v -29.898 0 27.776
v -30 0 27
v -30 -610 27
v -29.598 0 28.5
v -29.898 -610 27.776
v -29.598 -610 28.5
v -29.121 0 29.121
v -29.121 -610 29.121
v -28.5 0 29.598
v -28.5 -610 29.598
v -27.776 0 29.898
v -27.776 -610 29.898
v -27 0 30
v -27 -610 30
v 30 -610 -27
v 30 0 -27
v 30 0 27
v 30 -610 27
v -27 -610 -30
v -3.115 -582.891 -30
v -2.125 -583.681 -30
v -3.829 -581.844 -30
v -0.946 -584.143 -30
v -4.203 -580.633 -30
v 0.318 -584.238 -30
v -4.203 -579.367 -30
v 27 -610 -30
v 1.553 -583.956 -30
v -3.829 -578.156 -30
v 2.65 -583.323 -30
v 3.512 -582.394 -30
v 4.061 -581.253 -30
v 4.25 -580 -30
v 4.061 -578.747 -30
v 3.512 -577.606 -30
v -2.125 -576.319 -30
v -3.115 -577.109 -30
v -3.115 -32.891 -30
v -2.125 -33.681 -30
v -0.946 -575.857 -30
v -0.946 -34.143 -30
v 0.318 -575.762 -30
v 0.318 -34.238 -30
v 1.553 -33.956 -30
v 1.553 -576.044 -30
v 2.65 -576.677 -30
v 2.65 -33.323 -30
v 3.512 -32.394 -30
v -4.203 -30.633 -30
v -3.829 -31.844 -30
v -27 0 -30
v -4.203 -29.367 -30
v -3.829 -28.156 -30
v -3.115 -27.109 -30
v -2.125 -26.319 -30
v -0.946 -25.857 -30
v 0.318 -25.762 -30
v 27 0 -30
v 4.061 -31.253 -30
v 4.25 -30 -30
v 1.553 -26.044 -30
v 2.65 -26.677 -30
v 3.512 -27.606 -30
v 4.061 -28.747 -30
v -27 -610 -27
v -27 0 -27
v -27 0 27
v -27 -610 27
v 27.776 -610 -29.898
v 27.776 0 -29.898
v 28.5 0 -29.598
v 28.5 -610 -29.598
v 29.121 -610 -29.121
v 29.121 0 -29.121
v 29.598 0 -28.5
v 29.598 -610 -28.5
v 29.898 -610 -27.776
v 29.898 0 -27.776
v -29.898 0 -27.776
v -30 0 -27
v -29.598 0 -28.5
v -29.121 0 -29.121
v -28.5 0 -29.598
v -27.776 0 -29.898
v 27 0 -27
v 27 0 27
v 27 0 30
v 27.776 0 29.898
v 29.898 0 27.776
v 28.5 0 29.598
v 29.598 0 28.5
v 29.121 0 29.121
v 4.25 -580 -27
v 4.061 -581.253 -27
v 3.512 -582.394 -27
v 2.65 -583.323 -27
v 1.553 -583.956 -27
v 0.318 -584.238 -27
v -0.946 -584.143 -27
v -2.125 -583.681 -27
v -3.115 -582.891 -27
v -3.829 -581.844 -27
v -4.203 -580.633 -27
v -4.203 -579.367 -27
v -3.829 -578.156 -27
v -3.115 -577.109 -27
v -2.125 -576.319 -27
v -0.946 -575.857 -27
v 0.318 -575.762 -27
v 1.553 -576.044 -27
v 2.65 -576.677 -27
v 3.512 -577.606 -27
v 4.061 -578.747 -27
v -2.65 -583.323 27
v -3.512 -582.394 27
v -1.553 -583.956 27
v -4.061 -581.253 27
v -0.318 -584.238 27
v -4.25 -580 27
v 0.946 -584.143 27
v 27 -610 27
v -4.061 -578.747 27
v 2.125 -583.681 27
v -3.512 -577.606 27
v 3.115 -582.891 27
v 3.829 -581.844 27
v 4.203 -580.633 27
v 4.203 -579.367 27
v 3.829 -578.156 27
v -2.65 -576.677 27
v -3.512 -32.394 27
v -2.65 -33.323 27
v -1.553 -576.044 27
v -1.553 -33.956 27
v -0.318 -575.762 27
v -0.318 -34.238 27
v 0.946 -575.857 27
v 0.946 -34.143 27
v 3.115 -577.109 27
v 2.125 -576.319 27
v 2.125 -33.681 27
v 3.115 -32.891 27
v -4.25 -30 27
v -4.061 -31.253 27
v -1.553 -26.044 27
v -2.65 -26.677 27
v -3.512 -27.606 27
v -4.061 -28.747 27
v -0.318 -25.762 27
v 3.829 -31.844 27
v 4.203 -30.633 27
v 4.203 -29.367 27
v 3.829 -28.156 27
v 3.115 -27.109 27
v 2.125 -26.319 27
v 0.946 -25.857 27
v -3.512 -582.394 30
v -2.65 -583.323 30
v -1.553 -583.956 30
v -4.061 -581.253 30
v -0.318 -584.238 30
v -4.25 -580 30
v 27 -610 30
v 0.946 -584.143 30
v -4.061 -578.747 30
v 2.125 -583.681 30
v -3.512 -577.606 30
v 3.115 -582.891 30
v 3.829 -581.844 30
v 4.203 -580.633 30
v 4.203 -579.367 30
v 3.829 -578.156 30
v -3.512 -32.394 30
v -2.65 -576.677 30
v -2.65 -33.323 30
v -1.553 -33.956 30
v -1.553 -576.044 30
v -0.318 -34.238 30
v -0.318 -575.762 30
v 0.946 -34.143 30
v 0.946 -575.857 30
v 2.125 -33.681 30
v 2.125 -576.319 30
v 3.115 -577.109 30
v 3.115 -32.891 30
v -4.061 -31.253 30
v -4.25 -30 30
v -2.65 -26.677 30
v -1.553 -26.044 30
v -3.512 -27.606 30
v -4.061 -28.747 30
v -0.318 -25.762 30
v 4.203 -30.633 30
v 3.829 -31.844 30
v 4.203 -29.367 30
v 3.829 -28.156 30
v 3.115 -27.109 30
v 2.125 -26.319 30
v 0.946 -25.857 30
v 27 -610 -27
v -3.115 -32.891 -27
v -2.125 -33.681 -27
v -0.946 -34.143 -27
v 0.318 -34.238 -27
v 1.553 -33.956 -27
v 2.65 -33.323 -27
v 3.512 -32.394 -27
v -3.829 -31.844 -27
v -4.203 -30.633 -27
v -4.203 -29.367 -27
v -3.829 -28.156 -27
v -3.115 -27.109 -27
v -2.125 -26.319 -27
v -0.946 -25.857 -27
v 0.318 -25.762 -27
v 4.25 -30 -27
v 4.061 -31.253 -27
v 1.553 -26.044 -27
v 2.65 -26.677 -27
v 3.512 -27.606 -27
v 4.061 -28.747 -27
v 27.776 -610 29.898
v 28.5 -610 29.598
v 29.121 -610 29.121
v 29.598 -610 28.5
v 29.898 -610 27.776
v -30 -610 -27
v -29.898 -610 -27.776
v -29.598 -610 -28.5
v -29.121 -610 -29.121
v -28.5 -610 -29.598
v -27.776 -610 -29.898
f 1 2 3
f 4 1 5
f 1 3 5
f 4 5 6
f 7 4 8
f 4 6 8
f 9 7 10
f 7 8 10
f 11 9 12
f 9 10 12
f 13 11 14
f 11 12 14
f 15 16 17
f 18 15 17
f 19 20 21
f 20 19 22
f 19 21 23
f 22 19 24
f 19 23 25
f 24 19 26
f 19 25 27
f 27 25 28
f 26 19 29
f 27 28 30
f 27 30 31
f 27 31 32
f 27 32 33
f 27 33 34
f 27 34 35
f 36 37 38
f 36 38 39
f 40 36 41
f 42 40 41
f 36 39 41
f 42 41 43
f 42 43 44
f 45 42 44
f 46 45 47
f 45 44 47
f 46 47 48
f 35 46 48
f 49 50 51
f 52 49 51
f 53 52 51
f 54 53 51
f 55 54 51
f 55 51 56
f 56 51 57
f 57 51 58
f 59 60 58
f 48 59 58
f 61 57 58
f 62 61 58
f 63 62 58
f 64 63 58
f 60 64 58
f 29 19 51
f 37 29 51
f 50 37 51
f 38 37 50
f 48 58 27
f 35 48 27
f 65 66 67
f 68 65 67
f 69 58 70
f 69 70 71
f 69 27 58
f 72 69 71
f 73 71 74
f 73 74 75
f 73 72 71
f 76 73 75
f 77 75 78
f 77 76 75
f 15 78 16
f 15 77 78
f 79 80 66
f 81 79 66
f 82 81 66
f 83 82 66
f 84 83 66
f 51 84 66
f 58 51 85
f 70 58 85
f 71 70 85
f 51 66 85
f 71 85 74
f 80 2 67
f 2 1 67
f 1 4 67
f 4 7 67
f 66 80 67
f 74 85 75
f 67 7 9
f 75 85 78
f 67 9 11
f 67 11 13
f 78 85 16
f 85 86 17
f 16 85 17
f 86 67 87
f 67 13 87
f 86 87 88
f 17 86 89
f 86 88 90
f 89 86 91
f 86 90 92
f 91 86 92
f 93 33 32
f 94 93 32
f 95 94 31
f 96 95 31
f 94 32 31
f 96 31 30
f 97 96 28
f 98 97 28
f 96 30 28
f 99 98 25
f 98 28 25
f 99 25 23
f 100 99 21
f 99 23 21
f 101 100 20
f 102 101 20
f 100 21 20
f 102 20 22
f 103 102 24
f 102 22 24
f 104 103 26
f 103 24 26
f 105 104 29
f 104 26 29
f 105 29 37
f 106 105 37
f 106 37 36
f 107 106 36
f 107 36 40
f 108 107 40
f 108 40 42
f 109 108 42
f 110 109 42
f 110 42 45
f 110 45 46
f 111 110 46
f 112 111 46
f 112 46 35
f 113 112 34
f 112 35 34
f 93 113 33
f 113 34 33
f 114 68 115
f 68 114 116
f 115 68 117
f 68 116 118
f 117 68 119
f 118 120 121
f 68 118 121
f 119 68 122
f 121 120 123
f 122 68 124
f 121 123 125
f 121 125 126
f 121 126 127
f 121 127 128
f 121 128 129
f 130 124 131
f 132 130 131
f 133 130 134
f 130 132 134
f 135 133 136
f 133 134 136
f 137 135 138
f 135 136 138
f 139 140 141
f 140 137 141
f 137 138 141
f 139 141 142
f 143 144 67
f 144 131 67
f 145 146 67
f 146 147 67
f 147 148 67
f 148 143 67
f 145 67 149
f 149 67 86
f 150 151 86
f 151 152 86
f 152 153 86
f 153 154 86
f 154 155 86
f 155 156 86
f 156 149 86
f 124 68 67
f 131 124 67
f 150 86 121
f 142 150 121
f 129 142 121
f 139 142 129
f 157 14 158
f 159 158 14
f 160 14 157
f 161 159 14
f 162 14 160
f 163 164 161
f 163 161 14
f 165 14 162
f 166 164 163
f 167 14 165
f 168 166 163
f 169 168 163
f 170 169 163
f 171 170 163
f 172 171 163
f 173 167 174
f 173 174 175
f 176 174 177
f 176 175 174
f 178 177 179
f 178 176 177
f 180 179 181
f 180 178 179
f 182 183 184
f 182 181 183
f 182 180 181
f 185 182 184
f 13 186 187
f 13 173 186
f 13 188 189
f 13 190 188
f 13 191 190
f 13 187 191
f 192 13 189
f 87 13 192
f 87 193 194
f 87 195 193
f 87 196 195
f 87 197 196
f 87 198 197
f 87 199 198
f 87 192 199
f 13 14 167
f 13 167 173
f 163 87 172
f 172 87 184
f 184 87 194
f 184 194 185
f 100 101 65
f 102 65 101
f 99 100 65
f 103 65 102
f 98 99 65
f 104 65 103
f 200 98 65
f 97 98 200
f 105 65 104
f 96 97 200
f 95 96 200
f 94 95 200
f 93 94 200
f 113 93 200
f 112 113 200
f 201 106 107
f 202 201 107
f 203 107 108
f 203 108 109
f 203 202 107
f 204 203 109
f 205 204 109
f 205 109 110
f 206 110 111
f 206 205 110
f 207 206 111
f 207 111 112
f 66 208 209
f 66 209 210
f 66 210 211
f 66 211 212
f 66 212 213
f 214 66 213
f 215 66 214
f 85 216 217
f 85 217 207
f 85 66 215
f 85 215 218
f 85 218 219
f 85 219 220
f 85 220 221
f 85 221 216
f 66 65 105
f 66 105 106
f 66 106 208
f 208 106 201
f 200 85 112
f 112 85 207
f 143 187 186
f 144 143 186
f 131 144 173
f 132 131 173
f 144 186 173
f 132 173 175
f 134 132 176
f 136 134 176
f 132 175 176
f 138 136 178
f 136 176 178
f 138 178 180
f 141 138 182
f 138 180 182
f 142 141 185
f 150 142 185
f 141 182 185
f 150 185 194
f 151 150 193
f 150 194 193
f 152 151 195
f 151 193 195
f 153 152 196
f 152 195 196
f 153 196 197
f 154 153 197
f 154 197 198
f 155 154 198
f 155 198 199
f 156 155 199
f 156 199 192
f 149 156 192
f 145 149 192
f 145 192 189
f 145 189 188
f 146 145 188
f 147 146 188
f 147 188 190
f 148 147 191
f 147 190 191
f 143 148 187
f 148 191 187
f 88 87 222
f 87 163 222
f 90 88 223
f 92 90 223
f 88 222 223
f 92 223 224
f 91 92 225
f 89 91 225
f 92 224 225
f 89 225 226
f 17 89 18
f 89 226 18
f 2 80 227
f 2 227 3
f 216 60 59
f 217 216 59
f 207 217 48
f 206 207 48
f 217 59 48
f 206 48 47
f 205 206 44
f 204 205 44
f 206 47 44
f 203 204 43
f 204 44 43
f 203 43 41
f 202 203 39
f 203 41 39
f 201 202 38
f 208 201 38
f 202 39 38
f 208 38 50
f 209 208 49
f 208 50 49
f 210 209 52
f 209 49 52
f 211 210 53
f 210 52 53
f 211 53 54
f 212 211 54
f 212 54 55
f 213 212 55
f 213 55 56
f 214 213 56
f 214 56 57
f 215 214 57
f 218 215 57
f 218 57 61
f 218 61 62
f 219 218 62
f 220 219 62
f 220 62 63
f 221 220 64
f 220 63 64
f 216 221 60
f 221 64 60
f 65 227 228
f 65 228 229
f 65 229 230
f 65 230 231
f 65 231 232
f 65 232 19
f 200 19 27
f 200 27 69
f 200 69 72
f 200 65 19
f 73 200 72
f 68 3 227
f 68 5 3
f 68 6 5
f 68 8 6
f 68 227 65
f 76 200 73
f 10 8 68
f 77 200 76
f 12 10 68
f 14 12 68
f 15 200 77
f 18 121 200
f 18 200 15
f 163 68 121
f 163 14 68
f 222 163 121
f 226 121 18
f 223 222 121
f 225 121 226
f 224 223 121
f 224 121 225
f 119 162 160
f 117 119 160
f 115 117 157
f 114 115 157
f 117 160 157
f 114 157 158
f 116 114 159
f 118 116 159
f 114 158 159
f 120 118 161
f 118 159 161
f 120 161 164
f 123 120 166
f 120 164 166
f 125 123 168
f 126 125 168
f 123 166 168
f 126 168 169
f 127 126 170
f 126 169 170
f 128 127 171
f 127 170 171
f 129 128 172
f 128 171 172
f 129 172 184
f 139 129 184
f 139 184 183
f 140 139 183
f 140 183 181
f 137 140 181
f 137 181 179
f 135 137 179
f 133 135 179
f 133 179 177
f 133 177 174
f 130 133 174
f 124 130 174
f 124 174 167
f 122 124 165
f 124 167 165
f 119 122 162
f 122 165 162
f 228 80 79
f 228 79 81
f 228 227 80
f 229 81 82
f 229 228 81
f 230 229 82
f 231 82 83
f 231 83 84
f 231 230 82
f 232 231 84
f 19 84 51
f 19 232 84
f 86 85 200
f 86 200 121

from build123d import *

# Parameters (mm, degrees)
SKETCH_W        = 60
SKETCH_H        = 60
SKETCH_W_2      = 54
SKETCH_H_2      = 54
PAD_DEPTH       = 610
SKETCH001_R     = 4.25
POCKET_DEPTH    = 3
SKETCH002_R     = 4.25
POCKET001_DEPTH = 3
FILLET_R        = 3


with BuildPart() as part:
    # Sketch → Pad (new body)
    with BuildSketch(Plane.XZ):
        Rectangle(SKETCH_W, SKETCH_H)
        Rectangle(SKETCH_W_2, SKETCH_H_2, mode=Mode.SUBTRACT)
    extrude(amount=PAD_DEPTH)

    # Sketch001 (on Face1 of Pad) → Pocket (cut)
    with BuildSketch(Plane(origin=(0, 0, 30), x_dir=(-1, 0, 0), z_dir=(0, 0, 1))):
        with Locations((0, 30)):
            Circle(SKETCH001_R)
        with Locations((0, 580)):
            Circle(SKETCH001_R)
    extrude(amount=-POCKET_DEPTH, mode=Mode.SUBTRACT)

    # Sketch002 (on Face8 of Pocket) → Pocket001 (cut)
    with BuildSketch(Plane(origin=(0, 0, -30), x_dir=(1, 0, 0), z_dir=(0, 0, -1))):
        with Locations((0, 30)):
            Circle(SKETCH002_R)
        with Locations((0, 580)):
            Circle(SKETCH002_R)
    extrude(amount=-POCKET001_DEPTH, mode=Mode.SUBTRACT)

    # Fillet
    fillet_edges = [part.edges().sort_by_distance(p)[0] for p in [
        (30, -305, 30),
        (30, -305, -30),
        (-30, -305, -30),
        (-30, -305, 30),
    ]]
    fillet(fillet_edges, radius=FILLET_R)


solid = part.part
